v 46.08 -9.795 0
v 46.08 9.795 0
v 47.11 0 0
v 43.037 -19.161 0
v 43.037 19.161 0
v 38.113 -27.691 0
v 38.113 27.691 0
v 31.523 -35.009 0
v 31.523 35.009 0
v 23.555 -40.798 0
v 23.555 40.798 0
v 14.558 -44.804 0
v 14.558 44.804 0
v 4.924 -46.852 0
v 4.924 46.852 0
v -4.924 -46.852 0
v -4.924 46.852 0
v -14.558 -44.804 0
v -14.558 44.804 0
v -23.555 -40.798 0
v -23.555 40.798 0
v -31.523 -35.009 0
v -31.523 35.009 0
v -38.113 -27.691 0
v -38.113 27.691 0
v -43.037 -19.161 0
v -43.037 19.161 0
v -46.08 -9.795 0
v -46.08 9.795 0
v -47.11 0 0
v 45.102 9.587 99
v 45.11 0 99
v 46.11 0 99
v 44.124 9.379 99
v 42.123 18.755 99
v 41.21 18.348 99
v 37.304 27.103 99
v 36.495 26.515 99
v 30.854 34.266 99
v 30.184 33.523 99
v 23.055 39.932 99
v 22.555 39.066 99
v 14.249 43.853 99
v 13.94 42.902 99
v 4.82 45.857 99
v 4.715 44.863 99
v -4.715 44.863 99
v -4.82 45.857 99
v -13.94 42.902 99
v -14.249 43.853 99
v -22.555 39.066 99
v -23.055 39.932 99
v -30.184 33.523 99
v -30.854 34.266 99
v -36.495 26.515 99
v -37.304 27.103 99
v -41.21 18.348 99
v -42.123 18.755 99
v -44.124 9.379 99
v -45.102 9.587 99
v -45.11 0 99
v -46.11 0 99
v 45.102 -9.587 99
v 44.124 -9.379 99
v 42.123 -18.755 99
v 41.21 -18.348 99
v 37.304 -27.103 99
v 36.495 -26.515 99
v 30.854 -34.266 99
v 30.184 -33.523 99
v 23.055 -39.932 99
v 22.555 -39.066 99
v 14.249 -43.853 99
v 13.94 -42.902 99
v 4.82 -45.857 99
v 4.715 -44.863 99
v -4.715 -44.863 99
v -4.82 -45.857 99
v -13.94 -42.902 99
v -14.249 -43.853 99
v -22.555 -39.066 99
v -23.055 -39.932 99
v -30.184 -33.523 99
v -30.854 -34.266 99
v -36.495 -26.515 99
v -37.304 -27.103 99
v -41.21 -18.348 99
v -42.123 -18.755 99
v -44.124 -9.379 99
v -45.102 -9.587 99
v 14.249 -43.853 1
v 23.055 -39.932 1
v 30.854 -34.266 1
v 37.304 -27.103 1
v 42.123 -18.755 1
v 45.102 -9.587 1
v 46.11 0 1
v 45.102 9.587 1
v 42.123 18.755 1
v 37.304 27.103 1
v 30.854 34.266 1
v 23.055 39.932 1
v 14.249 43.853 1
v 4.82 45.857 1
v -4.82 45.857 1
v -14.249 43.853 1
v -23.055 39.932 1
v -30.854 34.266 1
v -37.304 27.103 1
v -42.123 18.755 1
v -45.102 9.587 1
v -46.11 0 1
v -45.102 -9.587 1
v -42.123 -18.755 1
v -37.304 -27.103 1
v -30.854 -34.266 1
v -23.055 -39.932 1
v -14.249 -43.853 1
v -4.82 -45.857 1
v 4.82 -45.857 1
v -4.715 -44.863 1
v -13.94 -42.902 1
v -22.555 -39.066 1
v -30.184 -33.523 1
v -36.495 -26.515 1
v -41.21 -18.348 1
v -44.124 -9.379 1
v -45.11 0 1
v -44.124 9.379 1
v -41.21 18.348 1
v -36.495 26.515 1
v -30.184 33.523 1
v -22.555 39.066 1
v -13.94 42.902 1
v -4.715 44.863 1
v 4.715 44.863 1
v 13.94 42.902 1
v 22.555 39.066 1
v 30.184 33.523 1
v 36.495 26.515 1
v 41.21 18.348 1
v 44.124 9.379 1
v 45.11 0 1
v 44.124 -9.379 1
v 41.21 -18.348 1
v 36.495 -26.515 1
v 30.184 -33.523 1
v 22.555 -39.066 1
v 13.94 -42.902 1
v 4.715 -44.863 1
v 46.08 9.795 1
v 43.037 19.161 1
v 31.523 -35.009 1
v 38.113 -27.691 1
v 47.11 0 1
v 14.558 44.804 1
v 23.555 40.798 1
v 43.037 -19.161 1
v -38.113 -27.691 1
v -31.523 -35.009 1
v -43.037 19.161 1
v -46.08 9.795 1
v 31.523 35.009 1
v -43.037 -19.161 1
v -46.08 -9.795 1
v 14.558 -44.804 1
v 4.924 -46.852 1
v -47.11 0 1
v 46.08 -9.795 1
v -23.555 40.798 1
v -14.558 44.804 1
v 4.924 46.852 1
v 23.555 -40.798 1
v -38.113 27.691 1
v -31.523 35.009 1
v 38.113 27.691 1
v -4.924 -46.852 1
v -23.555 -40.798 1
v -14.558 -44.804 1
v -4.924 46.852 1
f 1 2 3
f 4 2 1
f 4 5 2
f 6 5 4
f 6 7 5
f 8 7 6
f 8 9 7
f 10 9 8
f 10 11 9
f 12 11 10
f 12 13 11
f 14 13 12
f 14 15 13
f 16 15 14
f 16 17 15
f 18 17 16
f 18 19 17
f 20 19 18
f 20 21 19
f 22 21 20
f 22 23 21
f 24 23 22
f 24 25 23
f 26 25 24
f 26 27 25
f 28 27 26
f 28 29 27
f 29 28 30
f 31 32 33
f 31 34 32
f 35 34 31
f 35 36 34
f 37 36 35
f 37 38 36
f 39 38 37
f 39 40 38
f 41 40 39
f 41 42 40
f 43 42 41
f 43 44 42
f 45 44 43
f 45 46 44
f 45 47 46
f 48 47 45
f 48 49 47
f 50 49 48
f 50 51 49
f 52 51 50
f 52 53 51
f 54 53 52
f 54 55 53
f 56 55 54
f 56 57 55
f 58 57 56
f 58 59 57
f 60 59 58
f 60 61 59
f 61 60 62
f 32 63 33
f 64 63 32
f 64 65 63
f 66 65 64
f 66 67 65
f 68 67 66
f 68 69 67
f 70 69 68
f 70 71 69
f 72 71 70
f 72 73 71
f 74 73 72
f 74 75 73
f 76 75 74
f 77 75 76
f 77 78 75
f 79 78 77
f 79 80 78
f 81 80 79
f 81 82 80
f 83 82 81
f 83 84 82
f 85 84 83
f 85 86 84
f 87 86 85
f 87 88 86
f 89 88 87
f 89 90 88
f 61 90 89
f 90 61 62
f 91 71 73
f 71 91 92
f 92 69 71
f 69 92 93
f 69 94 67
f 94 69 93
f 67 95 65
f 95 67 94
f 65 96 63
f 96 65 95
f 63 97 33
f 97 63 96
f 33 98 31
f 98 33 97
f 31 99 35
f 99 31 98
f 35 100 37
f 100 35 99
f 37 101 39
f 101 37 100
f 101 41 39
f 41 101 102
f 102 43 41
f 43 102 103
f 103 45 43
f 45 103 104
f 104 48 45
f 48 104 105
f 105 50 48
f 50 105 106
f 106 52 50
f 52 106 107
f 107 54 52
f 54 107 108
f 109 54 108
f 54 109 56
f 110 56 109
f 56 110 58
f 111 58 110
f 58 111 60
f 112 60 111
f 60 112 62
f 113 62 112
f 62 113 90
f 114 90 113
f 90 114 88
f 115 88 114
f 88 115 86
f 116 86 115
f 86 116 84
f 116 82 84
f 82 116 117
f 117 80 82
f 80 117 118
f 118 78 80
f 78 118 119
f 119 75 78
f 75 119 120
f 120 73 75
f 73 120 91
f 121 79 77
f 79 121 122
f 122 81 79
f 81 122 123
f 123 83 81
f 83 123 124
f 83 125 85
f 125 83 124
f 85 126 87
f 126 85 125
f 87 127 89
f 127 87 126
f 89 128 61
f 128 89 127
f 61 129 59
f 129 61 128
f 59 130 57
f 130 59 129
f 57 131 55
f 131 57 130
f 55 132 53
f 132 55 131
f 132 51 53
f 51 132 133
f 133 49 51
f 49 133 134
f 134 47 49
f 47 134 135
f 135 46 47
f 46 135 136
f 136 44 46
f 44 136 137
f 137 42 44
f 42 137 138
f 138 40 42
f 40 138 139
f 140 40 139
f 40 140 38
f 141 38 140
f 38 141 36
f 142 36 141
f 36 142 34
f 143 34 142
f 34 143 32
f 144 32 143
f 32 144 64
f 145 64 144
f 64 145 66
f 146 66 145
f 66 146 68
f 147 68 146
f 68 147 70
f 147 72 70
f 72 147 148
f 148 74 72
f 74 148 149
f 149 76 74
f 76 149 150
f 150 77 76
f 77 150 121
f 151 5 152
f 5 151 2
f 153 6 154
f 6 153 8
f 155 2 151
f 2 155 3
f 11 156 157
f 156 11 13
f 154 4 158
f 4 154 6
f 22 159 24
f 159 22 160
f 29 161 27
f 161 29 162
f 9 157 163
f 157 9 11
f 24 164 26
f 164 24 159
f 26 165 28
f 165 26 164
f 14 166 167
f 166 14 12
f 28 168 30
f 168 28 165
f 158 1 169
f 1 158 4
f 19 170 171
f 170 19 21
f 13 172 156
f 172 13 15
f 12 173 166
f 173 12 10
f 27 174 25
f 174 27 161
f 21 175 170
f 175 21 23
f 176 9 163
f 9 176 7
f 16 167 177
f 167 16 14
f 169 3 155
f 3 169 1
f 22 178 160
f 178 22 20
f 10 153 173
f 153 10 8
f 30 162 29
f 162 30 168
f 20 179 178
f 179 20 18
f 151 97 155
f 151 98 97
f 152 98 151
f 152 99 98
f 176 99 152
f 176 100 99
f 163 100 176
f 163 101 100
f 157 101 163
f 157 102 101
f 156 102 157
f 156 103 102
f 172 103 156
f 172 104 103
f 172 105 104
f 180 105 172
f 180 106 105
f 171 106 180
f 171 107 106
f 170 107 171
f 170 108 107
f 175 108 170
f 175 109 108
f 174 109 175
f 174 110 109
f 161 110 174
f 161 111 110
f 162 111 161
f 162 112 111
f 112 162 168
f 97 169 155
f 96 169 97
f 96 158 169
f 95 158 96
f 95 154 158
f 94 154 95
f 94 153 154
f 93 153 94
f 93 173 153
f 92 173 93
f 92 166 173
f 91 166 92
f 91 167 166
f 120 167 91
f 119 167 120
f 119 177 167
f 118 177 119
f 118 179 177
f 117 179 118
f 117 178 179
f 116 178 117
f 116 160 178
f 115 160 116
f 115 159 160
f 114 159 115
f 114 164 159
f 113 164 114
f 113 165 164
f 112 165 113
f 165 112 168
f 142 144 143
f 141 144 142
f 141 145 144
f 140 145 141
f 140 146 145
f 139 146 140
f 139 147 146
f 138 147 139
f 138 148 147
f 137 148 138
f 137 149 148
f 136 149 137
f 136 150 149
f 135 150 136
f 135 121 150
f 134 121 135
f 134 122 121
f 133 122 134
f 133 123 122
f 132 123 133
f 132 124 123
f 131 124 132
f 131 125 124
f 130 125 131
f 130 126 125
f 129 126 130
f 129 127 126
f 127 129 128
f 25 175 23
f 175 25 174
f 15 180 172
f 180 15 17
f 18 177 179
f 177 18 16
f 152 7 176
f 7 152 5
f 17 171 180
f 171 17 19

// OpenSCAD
filename1 = ""; // [image_surface:100x100]
filename2 = ""; // [image_surface:100x100]
filename3 = ""; // [image_surface:100x100]
thickness = 2;
fn = 24;

// Create a triangle which is 1/fn of a circle. 
// Parameters:
//     r  - the circle radius 
//     fn - the same meaning as the $fn of OpenSCAD
module one_over_fn_for_circle(r, fn) {
    a = 360 / fn;
	x = r * cos(a / 2);
	y = r * sin(a / 2);
	polygon(points=[[0, 0], [x, y],[x, -y]]);
}

// Transform a model inito a cylinder.
// Parameters:
//     length - the model's length 
//     width  - the model's width
//     square_thickness - the model's thickness
//     fn - the same meaning as the $fn of OpenSCAD
module square_to_cylinder(length, width, square_thickness, fn) {
    r = length / 6.28318;
    a = 360 / fn;
	y = r * sin(a / 2);
	for(i = [0 : fn - 1]) {
	    rotate(a * i) translate([0, -(2 * y * i + y), 0]) intersection() {
		    translate([0, 2 * y * i + y, 0]) 
		        linear_extrude(width) 
				    one_over_fn_for_circle(r, fn);
			translate([r - square_thickness, 0, width]) 
	            rotate([0, 90, 0]) 
	                children(0);
		}
	}
}

// read Heightmap information from a png file.
// Parameters:
//     filename - a png filename
//     width  - the png's width
//     length  - the png's length
//     thickness - the height of the model
module from_png(filename, length, width, thickness) {
	translate([width - 1, 0, 0]) rotate(90) 
		scale([1, 1, 0.01 * thickness]) surface(filename); 
}

module blank_pen_holder(length, width, thickness) {
	color("black") linear_extrude(width) difference() {
		circle(length / 6.28318 - thickness / 2);
		circle(length / 6.28318 - thickness);
	}
	color("white") linear_extrude(thickness / 2) circle(length / 6.28318);
}

module png_to_pen_holder(filename, length, width, thickness) {
	blank_pen_holder(length - 1, width - 1, thickness);
	color("white") 
	    square_to_cylinder(length - 1, width - 1, thickness, fn)    
		    from_png(filename, length, width, thickness);
}

// specific for thingiverse customizer
module from_100x100_pngs(filenames, thickness) {
	translate([99, 0, 0]) rotate(90) { 
	    surface(filenames[0]); 
		translate([99, 0, 0]) surface(filenames[1]); 
		translate([198, 0, 0]) surface(filenames[2]); 
	}
}

// specific for thingiverse customizer
module 100x100_pngs_to_pen_holder(filenames, thickness) {
	blank_pen_holder(300 - 4, 100 - 1, thickness);
	color("white") 
	    square_to_cylinder(300 - 3, 100 - 1, thickness, fn)    
		    from_100x100_pngs(filenames, thickness);
}

// specific for thingiverse customizer
100x100_pngs_to_pen_holder([filename1, filename2, filename3], thickness);

/*

 if you use openscad directly, you may use the following code.
filename = "circuit.png";
png_to_pen_holder(filename, 300, 125, thickness);

*/
